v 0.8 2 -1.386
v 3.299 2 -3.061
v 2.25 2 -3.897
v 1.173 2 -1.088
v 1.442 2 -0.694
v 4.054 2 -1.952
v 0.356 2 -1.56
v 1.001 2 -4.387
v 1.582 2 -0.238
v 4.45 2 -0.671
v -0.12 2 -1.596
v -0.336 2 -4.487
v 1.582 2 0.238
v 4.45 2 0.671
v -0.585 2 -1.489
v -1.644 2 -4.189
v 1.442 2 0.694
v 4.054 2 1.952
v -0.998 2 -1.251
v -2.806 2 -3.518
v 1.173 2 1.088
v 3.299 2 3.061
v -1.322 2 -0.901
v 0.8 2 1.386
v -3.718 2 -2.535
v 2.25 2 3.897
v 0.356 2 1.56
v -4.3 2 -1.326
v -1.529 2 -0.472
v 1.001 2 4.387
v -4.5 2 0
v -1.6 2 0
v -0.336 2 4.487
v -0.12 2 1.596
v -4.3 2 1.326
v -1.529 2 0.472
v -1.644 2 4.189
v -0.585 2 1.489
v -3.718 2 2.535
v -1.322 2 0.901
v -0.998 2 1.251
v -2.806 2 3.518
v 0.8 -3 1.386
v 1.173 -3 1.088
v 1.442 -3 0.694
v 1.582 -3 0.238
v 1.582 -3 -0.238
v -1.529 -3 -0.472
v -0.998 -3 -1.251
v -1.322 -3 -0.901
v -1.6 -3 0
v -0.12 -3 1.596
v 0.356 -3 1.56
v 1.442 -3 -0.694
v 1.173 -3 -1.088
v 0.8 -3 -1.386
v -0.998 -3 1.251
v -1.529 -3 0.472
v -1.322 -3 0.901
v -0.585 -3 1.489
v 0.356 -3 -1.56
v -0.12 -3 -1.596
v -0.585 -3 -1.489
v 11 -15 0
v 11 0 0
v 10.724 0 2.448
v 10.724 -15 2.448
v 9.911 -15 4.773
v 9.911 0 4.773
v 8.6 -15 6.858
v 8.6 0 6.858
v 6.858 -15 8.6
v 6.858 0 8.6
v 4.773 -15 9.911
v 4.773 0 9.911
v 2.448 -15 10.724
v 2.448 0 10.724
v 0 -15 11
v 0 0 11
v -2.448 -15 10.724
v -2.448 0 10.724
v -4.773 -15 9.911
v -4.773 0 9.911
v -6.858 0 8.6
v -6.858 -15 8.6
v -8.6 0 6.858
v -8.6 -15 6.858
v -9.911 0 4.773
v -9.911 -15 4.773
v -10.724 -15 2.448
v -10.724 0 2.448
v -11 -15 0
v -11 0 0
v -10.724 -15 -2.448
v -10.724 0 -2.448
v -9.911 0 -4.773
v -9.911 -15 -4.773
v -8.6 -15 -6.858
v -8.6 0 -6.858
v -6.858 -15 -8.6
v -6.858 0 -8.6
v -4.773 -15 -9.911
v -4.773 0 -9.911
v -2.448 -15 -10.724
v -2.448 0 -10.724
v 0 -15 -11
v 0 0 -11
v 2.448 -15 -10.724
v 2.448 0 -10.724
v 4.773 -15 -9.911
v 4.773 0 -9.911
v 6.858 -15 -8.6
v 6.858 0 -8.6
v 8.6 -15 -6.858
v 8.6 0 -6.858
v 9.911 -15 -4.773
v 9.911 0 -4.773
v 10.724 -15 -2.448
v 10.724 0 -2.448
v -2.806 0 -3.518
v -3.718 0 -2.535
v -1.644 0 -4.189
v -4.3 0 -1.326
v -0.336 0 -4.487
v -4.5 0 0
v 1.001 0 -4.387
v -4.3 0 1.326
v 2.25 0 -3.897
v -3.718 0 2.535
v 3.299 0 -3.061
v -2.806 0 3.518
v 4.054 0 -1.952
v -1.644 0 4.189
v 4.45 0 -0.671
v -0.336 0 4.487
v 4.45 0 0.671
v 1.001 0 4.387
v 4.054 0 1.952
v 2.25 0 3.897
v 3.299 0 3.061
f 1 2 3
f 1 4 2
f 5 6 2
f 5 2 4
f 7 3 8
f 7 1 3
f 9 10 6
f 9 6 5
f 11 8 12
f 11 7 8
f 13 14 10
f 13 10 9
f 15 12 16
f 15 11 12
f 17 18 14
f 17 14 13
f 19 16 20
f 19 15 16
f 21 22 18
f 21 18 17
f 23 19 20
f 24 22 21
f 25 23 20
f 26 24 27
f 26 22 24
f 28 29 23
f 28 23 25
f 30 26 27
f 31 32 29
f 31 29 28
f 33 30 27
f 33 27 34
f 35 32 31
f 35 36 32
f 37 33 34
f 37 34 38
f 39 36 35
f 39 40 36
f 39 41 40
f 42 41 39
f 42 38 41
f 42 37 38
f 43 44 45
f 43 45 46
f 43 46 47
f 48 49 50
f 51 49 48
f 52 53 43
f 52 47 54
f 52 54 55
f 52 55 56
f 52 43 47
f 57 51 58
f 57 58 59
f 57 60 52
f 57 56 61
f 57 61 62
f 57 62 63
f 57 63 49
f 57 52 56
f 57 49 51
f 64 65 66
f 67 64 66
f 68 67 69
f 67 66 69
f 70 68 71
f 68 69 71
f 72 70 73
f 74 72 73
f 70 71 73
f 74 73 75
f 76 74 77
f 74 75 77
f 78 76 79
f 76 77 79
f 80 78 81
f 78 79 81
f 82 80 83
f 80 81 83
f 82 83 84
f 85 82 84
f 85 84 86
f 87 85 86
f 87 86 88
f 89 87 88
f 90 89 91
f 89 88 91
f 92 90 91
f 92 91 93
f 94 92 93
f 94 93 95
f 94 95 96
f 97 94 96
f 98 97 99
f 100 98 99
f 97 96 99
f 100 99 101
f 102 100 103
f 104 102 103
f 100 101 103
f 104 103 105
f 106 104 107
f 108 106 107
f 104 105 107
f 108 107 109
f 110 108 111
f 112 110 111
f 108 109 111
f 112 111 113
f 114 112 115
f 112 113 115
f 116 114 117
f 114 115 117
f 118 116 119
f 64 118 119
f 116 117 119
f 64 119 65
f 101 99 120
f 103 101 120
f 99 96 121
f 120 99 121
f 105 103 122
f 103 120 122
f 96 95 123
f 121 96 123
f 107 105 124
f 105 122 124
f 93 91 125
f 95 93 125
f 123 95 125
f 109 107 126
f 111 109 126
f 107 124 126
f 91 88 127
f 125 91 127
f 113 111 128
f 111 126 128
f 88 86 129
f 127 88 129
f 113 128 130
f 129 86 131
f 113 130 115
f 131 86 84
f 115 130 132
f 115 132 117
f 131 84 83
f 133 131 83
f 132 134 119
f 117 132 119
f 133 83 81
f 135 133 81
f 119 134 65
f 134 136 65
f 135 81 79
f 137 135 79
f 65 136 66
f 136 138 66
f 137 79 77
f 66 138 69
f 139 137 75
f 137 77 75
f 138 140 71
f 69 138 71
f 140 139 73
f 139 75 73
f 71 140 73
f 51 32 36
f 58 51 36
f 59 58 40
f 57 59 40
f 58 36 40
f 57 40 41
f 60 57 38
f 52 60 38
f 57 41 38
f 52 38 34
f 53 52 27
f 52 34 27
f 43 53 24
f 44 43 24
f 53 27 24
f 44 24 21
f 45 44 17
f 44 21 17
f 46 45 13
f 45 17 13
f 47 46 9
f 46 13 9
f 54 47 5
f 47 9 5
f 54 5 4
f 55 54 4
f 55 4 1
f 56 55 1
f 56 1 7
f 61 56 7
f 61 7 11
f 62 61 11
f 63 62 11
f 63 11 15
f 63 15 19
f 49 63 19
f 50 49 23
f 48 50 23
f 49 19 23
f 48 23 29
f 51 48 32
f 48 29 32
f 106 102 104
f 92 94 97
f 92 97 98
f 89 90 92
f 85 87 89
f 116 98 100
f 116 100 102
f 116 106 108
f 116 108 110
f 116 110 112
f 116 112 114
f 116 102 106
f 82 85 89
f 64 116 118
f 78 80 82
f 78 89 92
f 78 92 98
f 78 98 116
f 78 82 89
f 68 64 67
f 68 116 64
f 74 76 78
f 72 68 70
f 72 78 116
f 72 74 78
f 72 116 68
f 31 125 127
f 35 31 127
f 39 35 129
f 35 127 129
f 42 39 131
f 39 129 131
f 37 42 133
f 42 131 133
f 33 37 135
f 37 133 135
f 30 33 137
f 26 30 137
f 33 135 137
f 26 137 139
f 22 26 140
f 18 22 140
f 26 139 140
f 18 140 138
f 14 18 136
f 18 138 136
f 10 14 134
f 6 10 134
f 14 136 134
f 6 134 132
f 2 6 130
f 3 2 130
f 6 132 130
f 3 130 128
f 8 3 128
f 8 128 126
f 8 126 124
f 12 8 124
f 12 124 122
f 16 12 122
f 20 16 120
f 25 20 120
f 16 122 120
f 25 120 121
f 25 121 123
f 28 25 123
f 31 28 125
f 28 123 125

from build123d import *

# Parameters (mm, degrees)
F0_R     = 11
F1_DEPTH = 15
F2_R     = 4.5
F3_DEPTH = 2
F4_R     = 1.6
F5_DEPTH = 5


with BuildPart() as f1:
    # F0 (on Front) → F1 (new body)
    with BuildSketch(Plane.XZ):
        Circle(F0_R)
    extrude(amount=F1_DEPTH)

    # F2 (on face) → F3 (join)
    with BuildSketch(Plane(origin=(0, 0, 0), x_dir=(-1, 0, 0), z_dir=(0, 1, 0))):
        Circle(F2_R)
    extrude(amount=F3_DEPTH)

    # F4 (on face) → F5 (cut)
    with BuildSketch(Plane(origin=(0, 2, 0), x_dir=(-1, 0, 0), z_dir=(0, 1, 0))):
        Circle(F4_R)
    extrude(amount=-F5_DEPTH, mode=Mode.SUBTRACT)


solid = f1.part
